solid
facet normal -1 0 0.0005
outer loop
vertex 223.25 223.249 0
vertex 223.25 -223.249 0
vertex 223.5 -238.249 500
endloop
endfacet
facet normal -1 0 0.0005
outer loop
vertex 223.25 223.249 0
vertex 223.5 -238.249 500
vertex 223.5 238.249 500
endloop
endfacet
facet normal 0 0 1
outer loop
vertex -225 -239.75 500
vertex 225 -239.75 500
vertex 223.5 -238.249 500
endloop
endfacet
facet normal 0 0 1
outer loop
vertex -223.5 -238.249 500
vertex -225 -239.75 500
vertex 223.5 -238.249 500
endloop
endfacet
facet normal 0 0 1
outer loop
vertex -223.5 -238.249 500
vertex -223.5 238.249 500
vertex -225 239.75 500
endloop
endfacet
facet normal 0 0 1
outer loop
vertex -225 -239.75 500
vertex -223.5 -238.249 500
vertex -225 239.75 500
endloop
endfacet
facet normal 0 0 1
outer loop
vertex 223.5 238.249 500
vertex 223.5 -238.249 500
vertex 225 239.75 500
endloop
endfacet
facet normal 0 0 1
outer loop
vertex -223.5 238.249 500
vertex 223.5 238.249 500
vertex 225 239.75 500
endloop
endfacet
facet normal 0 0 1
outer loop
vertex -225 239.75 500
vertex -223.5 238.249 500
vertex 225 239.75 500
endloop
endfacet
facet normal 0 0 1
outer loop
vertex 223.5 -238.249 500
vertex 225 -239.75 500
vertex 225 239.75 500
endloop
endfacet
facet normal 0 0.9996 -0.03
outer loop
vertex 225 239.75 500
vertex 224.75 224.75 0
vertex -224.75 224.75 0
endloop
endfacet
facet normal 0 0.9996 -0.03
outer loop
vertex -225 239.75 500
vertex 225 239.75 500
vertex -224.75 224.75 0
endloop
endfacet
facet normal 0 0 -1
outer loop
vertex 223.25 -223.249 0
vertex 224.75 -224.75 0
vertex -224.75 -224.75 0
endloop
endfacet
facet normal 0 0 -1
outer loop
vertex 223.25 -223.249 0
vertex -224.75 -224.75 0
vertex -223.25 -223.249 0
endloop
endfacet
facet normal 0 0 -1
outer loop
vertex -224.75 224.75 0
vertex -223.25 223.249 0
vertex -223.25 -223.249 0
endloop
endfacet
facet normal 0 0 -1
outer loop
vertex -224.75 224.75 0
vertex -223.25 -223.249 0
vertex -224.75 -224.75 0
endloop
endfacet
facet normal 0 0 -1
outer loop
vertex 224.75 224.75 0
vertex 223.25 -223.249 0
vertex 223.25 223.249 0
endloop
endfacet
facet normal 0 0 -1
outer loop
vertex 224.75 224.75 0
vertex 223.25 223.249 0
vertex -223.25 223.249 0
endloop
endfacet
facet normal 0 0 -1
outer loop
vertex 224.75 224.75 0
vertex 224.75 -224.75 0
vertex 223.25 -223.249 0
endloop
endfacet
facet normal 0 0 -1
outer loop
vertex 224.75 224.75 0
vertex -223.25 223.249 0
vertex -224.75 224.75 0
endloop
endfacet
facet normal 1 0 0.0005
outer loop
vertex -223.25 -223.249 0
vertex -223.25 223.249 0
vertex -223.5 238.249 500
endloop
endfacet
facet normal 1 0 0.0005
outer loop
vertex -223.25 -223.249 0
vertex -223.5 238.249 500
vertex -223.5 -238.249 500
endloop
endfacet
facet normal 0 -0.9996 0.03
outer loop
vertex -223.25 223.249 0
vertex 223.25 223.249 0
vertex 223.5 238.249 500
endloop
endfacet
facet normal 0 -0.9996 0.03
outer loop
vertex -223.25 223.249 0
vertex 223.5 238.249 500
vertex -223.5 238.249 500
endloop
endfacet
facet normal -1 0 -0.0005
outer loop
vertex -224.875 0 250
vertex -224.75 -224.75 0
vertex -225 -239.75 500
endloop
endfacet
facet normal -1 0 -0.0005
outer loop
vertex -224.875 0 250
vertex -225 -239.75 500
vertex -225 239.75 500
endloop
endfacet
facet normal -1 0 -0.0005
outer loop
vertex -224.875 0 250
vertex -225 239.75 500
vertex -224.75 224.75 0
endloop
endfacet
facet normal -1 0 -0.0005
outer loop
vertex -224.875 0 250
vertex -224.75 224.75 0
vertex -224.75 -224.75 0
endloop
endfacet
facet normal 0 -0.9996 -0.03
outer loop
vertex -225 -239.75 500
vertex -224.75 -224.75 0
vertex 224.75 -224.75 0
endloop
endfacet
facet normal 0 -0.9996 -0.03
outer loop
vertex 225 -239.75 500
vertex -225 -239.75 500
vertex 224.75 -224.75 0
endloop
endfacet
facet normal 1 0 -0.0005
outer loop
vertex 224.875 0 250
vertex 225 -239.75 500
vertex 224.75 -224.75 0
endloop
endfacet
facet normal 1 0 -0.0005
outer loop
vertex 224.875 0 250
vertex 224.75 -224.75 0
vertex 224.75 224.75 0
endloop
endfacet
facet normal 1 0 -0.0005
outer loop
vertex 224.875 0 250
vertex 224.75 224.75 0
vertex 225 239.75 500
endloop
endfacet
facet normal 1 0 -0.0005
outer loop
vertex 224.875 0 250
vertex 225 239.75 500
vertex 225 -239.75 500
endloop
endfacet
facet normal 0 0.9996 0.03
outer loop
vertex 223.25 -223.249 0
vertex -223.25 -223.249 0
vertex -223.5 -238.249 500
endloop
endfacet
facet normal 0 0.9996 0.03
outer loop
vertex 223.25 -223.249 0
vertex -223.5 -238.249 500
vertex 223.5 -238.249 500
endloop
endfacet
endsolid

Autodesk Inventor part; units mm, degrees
ref_plane "YZ Plane" through (0, 0, 0) normal (1, 0, 0) x (0, 1, 0)
ref_plane "XZ Plane" through (0, 0, 0) normal (0, 1, 0) x (-1, 0, 0)
sketch "Sketch1" plane through (0, 0, 0) normal (0, 0, 1) x (1, 0, 0)
  line L0 (-223.25, 223.25) -> (223.25, 223.25)
  line L1 (-223.25, -223.25) -> (-223.25, 223.25)
  line L2 (223.25, 223.25) -> (223.25, -223.25)
  line L3 (223.25, -223.25) -> (-223.25, -223.25)
  line L4 (224.75, 224.75) -> (-224.75, 224.75)
  line L5 (-224.75, 224.75) -> (-224.75, -224.75)
  line L6 (-224.75, -224.75) -> (224.75, -224.75)
  line L7 (224.75, -224.75) -> (224.75, 224.75)
  point P0 (0, 0)
  point P1 (0, 0)
  dimension "d0" = 1.5
ref_plane "Work Plane1" through (0, 0, 500) normal (0, 0, 1) x (1, 0, 0)
sketch "Sketch2" plane through (0, 0, 500) normal (0, 0, 1) x (1, 0, 0)
  line L0 (-223.5, 238.25) -> (223.5, 238.25)
  line L1 (-223.5, -238.25) -> (-223.5, 238.25)
  line L2 (223.5, 238.25) -> (223.5, -238.25)
  line L3 (223.5, -238.25) -> (-223.5, -238.25)
  line L4 (225, 239.75) -> (-225, 239.75)
  line L5 (-225, 239.75) -> (-225, -239.75)
  line L6 (-225, -239.75) -> (225, -239.75)
  line L7 (225, -239.75) -> (225, 239.75)
  point P0 (0, 0)
  point P1 (0, 0)
  dimension "d2" = 1.5
loft "Loft1" add profiles "Sketch1", "Sketch2" contours L0 L2 L3 L1 | L7 L6 L5 L4 / L0 L2 L3 L1 | L7 L6 L5 L4
shell "Shell1" thickness 1.5 removed faces 2 at (-75, -79.9167, 500) at (74.9167, -74.9167, 0)
properties part number "Test Section Ver2"
